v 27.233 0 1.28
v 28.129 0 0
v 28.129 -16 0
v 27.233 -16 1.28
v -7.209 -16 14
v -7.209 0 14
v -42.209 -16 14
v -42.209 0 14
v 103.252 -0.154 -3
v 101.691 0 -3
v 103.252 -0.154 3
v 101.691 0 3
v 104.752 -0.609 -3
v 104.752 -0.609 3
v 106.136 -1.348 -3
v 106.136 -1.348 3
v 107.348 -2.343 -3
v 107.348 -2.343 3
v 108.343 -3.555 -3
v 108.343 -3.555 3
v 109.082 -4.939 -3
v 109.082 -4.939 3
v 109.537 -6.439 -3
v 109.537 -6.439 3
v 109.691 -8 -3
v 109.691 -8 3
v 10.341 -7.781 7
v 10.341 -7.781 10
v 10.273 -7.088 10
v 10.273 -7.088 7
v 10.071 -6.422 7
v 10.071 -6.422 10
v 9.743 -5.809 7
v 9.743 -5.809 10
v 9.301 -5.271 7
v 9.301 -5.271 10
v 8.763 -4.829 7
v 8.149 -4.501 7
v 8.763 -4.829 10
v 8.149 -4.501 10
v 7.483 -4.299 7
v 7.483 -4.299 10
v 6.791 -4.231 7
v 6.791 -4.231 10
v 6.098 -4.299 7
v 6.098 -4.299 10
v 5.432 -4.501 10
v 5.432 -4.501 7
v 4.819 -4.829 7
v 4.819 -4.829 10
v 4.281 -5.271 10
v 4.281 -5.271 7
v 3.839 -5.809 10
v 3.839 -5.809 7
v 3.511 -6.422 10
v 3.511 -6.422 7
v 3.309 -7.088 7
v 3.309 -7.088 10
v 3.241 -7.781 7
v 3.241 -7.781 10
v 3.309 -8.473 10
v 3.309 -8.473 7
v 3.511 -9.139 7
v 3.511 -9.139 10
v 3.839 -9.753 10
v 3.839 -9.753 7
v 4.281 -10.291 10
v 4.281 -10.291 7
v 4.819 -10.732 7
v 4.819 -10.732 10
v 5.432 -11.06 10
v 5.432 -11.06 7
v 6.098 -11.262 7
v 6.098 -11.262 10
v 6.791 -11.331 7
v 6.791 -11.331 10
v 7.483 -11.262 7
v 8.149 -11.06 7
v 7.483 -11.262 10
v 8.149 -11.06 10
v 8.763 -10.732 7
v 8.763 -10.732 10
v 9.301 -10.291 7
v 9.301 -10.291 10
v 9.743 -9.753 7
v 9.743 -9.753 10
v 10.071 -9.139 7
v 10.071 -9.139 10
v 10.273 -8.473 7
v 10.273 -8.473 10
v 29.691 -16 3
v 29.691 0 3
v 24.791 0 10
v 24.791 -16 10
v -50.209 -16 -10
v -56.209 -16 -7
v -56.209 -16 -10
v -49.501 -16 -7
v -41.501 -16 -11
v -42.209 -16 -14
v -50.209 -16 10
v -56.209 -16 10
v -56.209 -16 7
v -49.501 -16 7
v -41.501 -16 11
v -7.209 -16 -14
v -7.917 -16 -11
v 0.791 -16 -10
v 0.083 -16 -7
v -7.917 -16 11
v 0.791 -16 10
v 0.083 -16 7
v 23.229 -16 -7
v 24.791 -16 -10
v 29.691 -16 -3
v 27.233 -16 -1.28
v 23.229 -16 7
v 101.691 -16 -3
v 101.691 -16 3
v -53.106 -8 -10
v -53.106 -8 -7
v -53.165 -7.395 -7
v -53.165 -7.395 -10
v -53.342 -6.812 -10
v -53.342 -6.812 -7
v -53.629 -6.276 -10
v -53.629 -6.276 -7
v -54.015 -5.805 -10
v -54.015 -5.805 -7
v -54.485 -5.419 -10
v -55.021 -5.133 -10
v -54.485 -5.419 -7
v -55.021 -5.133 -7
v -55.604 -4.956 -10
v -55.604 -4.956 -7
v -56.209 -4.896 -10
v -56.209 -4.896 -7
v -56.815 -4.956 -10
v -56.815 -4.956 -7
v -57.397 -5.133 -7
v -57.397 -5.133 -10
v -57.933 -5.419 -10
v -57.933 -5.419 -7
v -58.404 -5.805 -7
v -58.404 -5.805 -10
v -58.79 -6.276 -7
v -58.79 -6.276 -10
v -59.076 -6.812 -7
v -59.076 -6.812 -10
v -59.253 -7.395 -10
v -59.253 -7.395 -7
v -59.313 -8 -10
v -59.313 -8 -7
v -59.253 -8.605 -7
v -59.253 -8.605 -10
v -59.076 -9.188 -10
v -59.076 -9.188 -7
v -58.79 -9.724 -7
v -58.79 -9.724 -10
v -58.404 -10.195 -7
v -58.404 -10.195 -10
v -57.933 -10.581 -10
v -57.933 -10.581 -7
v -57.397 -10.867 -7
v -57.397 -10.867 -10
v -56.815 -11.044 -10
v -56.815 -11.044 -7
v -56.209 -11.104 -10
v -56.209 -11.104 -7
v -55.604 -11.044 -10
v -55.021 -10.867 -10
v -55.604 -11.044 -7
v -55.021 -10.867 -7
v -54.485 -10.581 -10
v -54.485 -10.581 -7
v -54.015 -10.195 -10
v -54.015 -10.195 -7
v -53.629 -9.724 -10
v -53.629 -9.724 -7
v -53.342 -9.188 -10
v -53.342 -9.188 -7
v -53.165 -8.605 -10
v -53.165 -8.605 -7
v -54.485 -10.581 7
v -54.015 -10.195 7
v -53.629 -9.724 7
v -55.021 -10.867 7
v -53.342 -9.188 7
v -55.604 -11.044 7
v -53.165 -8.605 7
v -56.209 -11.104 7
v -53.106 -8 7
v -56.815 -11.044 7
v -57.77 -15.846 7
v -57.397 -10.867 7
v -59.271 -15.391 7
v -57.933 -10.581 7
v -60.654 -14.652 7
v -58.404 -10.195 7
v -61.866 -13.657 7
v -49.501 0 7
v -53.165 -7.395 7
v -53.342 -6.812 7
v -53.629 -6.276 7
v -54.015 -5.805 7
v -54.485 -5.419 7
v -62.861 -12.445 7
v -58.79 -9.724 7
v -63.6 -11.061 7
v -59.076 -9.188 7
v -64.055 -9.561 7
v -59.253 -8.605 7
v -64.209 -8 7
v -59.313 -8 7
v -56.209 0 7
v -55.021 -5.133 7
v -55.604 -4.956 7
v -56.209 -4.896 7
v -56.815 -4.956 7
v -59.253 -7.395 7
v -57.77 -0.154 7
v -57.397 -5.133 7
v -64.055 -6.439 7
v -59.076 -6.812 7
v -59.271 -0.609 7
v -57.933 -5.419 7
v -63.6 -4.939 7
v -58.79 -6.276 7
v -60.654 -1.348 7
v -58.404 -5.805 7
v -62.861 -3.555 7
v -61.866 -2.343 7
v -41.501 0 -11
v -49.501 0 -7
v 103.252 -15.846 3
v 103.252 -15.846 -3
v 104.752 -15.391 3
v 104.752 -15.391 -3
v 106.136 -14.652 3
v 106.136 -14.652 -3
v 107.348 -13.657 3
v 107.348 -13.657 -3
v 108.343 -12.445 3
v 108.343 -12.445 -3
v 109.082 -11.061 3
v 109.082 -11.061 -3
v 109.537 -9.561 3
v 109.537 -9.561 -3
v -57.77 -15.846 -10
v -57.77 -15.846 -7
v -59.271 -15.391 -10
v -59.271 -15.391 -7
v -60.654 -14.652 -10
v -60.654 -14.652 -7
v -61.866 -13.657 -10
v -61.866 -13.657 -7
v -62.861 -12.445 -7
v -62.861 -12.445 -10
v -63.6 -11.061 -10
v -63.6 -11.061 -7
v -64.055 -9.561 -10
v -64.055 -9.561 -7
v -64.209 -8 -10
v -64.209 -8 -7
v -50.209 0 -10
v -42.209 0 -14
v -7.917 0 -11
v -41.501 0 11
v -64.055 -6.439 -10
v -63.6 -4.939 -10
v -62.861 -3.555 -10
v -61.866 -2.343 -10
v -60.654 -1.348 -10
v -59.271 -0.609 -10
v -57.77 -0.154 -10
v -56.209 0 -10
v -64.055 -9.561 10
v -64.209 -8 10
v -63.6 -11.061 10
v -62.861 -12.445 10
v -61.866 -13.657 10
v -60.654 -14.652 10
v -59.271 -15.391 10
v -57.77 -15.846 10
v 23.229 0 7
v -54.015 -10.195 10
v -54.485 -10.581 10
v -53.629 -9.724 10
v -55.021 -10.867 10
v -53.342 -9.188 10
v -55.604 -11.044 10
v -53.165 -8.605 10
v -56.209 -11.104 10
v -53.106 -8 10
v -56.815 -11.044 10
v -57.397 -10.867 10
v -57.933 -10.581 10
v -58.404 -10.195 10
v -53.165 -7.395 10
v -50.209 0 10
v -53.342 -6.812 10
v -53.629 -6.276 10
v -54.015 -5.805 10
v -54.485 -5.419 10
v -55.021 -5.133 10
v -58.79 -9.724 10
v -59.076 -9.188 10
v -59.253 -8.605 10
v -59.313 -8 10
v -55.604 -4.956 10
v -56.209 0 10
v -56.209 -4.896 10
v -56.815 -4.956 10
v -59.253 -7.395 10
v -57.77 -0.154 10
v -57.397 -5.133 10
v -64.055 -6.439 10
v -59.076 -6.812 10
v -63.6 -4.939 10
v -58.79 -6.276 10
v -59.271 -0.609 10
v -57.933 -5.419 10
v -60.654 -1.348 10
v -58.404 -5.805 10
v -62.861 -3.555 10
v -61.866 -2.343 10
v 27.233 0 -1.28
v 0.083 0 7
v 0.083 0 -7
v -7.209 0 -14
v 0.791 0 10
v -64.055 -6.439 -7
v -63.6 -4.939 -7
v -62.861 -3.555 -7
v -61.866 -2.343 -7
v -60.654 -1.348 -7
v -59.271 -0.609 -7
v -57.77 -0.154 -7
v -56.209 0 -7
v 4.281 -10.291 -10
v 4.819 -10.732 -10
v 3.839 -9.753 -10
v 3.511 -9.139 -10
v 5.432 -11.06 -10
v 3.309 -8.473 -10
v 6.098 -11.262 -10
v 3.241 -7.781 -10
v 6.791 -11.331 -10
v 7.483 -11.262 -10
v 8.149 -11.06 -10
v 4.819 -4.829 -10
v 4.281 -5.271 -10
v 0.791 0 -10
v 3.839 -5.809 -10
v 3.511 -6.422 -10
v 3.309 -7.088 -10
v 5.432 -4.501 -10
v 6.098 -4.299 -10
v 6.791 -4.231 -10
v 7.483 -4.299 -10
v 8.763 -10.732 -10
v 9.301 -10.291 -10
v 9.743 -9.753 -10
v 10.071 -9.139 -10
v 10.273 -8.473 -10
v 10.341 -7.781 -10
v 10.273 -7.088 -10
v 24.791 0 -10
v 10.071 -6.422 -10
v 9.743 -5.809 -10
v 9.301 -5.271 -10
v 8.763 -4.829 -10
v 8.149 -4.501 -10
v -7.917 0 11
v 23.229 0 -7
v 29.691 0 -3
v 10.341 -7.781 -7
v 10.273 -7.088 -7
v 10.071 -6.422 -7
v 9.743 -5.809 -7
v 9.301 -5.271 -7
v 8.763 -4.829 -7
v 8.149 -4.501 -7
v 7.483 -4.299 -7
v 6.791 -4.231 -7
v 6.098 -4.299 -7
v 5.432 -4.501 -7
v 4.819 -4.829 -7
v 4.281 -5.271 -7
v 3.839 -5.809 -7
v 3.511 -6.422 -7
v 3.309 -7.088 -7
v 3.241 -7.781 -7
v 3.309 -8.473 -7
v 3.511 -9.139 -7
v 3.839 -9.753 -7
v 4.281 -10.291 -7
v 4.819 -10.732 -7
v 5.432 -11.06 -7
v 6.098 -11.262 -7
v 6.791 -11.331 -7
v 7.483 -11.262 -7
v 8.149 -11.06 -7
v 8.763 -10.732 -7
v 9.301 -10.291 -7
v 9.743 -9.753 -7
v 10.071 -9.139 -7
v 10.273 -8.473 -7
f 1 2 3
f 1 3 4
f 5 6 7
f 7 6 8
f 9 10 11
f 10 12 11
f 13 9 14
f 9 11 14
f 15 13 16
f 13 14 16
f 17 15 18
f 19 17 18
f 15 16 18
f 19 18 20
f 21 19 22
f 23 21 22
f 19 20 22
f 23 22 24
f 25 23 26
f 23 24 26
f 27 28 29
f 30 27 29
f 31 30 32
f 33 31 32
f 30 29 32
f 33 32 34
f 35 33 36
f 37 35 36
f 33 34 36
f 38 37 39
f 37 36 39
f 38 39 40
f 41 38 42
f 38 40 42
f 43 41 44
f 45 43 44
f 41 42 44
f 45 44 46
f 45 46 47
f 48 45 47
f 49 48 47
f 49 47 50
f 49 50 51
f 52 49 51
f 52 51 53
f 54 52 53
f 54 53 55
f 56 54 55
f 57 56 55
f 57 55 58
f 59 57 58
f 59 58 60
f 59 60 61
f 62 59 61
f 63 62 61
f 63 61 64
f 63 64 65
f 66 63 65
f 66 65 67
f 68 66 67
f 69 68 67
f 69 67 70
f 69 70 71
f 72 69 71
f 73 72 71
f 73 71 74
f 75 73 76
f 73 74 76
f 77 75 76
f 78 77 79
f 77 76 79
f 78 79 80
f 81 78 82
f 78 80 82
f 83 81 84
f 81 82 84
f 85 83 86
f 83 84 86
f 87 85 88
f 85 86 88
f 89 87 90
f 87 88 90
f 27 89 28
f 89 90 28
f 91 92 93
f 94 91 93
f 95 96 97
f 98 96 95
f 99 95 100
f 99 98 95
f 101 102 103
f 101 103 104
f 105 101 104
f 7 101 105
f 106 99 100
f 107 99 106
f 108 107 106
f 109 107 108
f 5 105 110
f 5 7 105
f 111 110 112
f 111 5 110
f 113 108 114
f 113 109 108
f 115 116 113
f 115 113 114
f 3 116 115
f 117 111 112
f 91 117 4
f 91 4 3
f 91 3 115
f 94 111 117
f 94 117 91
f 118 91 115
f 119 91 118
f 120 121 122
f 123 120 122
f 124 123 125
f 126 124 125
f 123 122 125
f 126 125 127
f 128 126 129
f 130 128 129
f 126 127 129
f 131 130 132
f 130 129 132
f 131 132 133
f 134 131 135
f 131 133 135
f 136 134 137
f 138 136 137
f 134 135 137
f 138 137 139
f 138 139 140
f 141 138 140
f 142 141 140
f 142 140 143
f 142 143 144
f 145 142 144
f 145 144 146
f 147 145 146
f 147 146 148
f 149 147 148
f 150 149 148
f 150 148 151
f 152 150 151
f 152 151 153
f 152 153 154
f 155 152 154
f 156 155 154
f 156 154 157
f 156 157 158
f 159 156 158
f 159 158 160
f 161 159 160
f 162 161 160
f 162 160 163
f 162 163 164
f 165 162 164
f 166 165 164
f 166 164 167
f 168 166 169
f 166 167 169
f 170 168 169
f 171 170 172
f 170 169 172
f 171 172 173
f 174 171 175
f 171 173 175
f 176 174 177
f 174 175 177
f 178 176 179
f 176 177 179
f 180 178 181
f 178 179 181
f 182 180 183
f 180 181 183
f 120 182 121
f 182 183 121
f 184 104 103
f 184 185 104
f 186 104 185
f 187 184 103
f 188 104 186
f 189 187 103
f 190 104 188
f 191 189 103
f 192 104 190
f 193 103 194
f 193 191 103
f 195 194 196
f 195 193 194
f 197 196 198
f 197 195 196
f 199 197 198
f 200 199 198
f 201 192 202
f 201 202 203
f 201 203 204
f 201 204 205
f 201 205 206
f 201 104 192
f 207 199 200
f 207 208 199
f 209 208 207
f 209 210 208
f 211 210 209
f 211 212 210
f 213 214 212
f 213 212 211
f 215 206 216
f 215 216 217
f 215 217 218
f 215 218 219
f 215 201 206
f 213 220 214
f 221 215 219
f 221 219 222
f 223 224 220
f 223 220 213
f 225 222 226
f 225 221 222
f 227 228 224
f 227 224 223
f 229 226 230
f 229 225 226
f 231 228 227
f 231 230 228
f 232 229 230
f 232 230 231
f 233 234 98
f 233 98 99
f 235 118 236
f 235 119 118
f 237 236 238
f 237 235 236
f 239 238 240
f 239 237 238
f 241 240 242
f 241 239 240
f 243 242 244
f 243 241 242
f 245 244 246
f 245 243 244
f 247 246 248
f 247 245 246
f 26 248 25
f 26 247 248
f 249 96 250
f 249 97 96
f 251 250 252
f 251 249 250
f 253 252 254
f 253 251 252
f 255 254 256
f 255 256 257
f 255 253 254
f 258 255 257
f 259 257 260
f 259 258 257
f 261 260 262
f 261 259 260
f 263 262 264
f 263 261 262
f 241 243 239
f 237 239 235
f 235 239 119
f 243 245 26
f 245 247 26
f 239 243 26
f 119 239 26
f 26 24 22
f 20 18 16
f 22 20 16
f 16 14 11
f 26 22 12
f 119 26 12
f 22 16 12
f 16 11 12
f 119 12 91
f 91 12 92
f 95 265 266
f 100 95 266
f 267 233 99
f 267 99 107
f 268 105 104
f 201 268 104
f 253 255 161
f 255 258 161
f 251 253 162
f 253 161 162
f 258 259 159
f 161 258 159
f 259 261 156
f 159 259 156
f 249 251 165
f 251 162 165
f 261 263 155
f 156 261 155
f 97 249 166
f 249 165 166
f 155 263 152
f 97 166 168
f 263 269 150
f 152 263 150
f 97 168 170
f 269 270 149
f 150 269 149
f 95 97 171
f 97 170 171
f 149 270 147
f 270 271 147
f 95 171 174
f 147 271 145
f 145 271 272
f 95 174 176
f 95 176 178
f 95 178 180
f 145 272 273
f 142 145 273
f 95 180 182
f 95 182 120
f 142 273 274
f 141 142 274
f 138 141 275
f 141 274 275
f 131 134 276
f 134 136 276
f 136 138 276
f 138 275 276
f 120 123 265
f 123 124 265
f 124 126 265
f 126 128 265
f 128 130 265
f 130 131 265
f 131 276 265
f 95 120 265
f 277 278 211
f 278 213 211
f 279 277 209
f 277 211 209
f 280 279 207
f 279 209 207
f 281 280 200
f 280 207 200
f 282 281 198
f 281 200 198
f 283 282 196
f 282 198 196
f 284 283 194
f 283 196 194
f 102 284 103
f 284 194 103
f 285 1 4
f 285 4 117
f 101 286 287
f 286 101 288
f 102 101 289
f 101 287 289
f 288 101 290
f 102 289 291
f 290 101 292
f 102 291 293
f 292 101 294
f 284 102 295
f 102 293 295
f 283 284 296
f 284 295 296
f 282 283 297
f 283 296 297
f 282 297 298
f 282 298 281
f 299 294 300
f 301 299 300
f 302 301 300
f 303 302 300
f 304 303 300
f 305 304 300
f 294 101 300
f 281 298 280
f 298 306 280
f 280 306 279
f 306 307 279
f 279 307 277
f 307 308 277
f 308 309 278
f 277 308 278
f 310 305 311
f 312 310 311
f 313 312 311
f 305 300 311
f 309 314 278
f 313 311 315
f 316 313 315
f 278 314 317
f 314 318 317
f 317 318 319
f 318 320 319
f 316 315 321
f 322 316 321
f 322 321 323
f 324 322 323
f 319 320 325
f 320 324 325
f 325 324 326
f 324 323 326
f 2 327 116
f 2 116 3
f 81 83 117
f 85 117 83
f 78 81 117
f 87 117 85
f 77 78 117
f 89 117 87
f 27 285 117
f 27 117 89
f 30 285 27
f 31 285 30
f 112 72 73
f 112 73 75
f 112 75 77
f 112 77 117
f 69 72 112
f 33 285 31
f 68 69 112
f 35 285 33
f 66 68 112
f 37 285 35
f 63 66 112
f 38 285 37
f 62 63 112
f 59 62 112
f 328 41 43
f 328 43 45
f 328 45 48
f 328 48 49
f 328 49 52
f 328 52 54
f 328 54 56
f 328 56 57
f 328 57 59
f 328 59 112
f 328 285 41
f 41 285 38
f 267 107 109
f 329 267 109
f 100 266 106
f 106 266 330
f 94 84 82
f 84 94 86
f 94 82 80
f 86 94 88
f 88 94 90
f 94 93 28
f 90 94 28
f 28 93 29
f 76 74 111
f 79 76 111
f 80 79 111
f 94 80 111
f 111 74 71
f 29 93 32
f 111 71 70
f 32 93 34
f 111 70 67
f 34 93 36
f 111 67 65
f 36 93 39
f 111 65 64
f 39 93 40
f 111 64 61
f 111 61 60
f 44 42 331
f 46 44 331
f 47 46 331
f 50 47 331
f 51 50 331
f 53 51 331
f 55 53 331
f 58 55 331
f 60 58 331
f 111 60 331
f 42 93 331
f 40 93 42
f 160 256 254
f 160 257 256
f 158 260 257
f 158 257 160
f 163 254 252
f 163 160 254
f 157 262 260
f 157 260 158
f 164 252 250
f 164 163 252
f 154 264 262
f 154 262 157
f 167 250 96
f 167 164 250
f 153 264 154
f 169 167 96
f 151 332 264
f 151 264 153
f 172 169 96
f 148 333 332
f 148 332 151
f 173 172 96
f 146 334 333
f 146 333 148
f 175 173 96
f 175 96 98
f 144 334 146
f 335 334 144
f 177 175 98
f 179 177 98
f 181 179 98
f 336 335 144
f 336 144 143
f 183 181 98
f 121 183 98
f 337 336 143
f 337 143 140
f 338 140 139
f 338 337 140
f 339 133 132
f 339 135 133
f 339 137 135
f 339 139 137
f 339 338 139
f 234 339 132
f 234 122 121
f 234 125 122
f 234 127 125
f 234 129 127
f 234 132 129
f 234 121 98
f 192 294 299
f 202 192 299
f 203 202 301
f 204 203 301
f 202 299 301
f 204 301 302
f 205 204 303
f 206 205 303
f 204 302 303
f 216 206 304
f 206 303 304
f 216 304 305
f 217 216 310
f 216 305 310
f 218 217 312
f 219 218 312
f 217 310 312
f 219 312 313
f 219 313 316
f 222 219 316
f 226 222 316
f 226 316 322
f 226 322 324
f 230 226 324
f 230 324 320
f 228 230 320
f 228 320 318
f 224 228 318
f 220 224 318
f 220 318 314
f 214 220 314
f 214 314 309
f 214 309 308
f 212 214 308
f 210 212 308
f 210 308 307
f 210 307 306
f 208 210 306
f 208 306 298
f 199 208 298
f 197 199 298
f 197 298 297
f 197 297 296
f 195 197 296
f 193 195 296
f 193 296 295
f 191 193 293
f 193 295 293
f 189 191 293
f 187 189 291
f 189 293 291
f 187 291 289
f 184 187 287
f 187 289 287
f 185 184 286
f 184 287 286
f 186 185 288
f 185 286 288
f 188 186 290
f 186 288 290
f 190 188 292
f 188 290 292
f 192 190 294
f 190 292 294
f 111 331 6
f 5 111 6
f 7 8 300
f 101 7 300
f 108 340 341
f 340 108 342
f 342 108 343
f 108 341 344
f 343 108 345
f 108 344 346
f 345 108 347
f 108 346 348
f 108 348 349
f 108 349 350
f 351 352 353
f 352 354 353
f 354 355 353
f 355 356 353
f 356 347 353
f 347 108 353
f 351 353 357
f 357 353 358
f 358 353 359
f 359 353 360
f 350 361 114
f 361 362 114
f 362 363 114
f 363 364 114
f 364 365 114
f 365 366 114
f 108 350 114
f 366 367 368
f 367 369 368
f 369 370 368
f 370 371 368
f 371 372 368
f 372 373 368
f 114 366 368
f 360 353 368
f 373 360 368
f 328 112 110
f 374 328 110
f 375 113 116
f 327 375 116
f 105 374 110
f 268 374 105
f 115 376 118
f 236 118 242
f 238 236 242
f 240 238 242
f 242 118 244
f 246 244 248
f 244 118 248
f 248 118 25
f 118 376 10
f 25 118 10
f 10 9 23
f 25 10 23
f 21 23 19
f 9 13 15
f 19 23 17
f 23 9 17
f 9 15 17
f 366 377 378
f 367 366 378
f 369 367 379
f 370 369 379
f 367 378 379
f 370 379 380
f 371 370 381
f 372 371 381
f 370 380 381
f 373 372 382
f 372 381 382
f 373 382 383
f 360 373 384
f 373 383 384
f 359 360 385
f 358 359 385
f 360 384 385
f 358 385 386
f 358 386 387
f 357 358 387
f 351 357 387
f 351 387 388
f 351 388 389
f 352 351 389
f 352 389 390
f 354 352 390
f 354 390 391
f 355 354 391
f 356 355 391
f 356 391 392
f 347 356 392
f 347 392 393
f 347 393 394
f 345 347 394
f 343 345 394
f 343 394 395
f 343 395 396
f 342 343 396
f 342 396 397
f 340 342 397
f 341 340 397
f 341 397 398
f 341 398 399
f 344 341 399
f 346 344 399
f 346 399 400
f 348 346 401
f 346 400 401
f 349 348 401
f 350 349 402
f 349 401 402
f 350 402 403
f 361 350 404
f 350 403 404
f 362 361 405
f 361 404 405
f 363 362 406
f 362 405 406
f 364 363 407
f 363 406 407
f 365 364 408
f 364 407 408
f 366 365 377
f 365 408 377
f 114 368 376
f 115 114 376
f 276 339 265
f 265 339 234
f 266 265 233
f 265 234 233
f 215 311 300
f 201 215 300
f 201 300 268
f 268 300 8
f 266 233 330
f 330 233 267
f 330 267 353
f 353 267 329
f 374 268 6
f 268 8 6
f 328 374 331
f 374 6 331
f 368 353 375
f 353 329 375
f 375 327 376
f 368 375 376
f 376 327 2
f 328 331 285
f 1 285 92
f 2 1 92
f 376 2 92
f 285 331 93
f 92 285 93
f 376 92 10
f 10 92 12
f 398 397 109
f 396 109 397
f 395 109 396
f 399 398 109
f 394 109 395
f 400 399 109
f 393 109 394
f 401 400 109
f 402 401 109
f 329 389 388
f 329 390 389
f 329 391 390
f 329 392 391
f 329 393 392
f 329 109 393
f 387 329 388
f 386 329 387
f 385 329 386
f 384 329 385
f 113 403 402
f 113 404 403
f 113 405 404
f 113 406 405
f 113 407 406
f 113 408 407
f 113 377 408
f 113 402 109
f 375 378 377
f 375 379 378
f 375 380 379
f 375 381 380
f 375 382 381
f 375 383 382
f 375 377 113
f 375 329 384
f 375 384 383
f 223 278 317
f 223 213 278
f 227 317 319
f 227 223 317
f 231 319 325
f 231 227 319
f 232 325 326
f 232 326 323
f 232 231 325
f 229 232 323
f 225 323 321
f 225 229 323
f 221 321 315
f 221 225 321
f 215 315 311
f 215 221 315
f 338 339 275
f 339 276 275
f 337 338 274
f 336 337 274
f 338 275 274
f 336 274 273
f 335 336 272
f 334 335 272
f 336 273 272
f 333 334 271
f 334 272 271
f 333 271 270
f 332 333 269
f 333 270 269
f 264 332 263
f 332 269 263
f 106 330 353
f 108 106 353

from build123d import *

# Parameters (mm, degrees)
F1_DEPTH    = 16
F2_T        = 3
F2_T3_DEPTH = 22
F3_R        = 7.99999
F4_R        = 3.1035458613
F4_R_2      = 3.5498541614
F5_DEPTH    = 20


# Not quite as in the source:
# - a fillet or chamfer is up to 0.001 mm smaller than in the source, because OpenCascade refuses the exact size
# - a shell that OpenCascade refuses in one call is made with other operations: the cavity is built on its own and cut out


with BuildPart() as f1:
    # F0 (on Front) → F1 (new body)
    with BuildSketch(Plane.XZ):
        Polygon((-64.2090581298, 10), (-64.2090581298, 0), (31.7909418702, 0), (29.6909418702, 3), (24.7909418702, 10), (0.7909418702, 10), (-7.2090581298, 14), (-42.2090581298, 14), (-50.2090581298, 10), align=None)
        Polygon((31.7909418702, 0), (-64.2090581298, 0), (-64.2090581298, -10), (-50.2090581298, -10), (-42.2090581298, -14), (-7.2090581298, -14), (0.7909418702, -10), (24.7909418702, -10), (29.6909418702, -3), align=None)
        Polygon((29.6909418702, 3), (31.7909418702, 0), (29.6909418702, -3), (109.6909418702, -3), (109.6909418702, 3), align=None)
    extrude(amount=F1_DEPTH)

    # F2: shell of thickness 3, made by hand


with BuildPart() as f2_core1:
    # F2_t2: copy of F1
    add(f1.part)

    # the walls: a layer under each face that stays
    f2_faces = [f2_core1.faces().sort_by_distance(p)[0] for p in [
        (-24.7090581298, -8, 14),
        (-46.2090581298, -8, 12),
        (-57.2090581298, -8, 10),
        (-57.2090581298, -8, -10),
        (-46.2090581298, -8, -12),
        (-24.7090581298, -8, -14),
        (-3.2090581298, -8, -12),
        (12.7909418702, -8, -10),
        (27.2409418702, -8, -6.5),
        (69.6909418702, -8, -3),
        (109.6909418702, -8, 0),
        (69.6909418702, -8, 3),
        (27.2409418702, -8, 6.5),
        (12.7909418702, -8, 10),
        (-3.2090581298, -8, 12),
    ]]
    thicken(f2_faces, amount=-F2_T, mode=Mode.SUBTRACT)

    # F2_s4 → F2_t3 (cut)
    with BuildSketch(Plane.XZ.offset(-3)):
        Polygon((-50.2224745377, 10.0568328157), (-48.8674173433, 7.316718427), (-49.5008541973, 7), (-50.2090581298, 7), align=None)
        Polygon((-50.2224745377, -10.0568328157), (-50.2090581298, -7), (-49.5008541973, -7), (-48.8674173433, -7.316718427), align=None)
        Polygon((0.8043582781, -10.0568328157), (-0.5506989163, -7.316718427), (0.0827379377, -7), (0.7909418702, -7), align=None)
        Polygon((29.7155188278, -3.0472038703), (27.2332461087, -1.2796129669), (28.1289751855, 0), (29.6909418702, 0), align=None)
        Polygon((29.7155188278, 3.0472038703), (29.6909418702, 0), (28.1289751855, 0), (27.2332461087, 1.2796129669), align=None)
        Polygon((0.8043582781, 10.0568328157), (0.7909418702, 7), (0.0827379377, 7), (-0.5506989163, 7.316718427), align=None)
    extrude(amount=F2_T3_DEPTH, mode=Mode.SUBTRACT)


with BuildPart() as f1_1:
    add(f1.part)

    # what is left inside the walls is the cavity
    f2_cavity = [f2_core1.part.solids().sort_by_distance(p)[0] for p in [
        (-18.040041, -15.97, -3.666667),
    ]]
    add(f2_cavity, mode=Mode.SUBTRACT)

    # F3 (radius 8 in the source; OpenCascade refuses exactly that, so slightly less here)
    f3_edges = [f1_1.edges().sort_by_distance(p)[0] for p in [
        (-64.209058, -16, -8.5),
        (-64.209058, -16, 8.5),
        (-64.209058, 0, -8.5),
        (-64.209058, 0, 8.5),
        (109.690942, -16, 0),
        (109.690942, 0, 0),
    ]]
    fillet(f3_edges, radius=F3_R)

    # F4 (on face) → F5 (cut)
    with BuildSketch(Plane.XY.offset(10)):
        with Locations((-56.2090581298, -8)):
            Circle(F4_R)
        with Locations((6.7909418702, -7.7808454374)):
            Circle(F4_R_2)
    extrude(amount=-F5_DEPTH, mode=Mode.SUBTRACT)


solid = f1_1.part
